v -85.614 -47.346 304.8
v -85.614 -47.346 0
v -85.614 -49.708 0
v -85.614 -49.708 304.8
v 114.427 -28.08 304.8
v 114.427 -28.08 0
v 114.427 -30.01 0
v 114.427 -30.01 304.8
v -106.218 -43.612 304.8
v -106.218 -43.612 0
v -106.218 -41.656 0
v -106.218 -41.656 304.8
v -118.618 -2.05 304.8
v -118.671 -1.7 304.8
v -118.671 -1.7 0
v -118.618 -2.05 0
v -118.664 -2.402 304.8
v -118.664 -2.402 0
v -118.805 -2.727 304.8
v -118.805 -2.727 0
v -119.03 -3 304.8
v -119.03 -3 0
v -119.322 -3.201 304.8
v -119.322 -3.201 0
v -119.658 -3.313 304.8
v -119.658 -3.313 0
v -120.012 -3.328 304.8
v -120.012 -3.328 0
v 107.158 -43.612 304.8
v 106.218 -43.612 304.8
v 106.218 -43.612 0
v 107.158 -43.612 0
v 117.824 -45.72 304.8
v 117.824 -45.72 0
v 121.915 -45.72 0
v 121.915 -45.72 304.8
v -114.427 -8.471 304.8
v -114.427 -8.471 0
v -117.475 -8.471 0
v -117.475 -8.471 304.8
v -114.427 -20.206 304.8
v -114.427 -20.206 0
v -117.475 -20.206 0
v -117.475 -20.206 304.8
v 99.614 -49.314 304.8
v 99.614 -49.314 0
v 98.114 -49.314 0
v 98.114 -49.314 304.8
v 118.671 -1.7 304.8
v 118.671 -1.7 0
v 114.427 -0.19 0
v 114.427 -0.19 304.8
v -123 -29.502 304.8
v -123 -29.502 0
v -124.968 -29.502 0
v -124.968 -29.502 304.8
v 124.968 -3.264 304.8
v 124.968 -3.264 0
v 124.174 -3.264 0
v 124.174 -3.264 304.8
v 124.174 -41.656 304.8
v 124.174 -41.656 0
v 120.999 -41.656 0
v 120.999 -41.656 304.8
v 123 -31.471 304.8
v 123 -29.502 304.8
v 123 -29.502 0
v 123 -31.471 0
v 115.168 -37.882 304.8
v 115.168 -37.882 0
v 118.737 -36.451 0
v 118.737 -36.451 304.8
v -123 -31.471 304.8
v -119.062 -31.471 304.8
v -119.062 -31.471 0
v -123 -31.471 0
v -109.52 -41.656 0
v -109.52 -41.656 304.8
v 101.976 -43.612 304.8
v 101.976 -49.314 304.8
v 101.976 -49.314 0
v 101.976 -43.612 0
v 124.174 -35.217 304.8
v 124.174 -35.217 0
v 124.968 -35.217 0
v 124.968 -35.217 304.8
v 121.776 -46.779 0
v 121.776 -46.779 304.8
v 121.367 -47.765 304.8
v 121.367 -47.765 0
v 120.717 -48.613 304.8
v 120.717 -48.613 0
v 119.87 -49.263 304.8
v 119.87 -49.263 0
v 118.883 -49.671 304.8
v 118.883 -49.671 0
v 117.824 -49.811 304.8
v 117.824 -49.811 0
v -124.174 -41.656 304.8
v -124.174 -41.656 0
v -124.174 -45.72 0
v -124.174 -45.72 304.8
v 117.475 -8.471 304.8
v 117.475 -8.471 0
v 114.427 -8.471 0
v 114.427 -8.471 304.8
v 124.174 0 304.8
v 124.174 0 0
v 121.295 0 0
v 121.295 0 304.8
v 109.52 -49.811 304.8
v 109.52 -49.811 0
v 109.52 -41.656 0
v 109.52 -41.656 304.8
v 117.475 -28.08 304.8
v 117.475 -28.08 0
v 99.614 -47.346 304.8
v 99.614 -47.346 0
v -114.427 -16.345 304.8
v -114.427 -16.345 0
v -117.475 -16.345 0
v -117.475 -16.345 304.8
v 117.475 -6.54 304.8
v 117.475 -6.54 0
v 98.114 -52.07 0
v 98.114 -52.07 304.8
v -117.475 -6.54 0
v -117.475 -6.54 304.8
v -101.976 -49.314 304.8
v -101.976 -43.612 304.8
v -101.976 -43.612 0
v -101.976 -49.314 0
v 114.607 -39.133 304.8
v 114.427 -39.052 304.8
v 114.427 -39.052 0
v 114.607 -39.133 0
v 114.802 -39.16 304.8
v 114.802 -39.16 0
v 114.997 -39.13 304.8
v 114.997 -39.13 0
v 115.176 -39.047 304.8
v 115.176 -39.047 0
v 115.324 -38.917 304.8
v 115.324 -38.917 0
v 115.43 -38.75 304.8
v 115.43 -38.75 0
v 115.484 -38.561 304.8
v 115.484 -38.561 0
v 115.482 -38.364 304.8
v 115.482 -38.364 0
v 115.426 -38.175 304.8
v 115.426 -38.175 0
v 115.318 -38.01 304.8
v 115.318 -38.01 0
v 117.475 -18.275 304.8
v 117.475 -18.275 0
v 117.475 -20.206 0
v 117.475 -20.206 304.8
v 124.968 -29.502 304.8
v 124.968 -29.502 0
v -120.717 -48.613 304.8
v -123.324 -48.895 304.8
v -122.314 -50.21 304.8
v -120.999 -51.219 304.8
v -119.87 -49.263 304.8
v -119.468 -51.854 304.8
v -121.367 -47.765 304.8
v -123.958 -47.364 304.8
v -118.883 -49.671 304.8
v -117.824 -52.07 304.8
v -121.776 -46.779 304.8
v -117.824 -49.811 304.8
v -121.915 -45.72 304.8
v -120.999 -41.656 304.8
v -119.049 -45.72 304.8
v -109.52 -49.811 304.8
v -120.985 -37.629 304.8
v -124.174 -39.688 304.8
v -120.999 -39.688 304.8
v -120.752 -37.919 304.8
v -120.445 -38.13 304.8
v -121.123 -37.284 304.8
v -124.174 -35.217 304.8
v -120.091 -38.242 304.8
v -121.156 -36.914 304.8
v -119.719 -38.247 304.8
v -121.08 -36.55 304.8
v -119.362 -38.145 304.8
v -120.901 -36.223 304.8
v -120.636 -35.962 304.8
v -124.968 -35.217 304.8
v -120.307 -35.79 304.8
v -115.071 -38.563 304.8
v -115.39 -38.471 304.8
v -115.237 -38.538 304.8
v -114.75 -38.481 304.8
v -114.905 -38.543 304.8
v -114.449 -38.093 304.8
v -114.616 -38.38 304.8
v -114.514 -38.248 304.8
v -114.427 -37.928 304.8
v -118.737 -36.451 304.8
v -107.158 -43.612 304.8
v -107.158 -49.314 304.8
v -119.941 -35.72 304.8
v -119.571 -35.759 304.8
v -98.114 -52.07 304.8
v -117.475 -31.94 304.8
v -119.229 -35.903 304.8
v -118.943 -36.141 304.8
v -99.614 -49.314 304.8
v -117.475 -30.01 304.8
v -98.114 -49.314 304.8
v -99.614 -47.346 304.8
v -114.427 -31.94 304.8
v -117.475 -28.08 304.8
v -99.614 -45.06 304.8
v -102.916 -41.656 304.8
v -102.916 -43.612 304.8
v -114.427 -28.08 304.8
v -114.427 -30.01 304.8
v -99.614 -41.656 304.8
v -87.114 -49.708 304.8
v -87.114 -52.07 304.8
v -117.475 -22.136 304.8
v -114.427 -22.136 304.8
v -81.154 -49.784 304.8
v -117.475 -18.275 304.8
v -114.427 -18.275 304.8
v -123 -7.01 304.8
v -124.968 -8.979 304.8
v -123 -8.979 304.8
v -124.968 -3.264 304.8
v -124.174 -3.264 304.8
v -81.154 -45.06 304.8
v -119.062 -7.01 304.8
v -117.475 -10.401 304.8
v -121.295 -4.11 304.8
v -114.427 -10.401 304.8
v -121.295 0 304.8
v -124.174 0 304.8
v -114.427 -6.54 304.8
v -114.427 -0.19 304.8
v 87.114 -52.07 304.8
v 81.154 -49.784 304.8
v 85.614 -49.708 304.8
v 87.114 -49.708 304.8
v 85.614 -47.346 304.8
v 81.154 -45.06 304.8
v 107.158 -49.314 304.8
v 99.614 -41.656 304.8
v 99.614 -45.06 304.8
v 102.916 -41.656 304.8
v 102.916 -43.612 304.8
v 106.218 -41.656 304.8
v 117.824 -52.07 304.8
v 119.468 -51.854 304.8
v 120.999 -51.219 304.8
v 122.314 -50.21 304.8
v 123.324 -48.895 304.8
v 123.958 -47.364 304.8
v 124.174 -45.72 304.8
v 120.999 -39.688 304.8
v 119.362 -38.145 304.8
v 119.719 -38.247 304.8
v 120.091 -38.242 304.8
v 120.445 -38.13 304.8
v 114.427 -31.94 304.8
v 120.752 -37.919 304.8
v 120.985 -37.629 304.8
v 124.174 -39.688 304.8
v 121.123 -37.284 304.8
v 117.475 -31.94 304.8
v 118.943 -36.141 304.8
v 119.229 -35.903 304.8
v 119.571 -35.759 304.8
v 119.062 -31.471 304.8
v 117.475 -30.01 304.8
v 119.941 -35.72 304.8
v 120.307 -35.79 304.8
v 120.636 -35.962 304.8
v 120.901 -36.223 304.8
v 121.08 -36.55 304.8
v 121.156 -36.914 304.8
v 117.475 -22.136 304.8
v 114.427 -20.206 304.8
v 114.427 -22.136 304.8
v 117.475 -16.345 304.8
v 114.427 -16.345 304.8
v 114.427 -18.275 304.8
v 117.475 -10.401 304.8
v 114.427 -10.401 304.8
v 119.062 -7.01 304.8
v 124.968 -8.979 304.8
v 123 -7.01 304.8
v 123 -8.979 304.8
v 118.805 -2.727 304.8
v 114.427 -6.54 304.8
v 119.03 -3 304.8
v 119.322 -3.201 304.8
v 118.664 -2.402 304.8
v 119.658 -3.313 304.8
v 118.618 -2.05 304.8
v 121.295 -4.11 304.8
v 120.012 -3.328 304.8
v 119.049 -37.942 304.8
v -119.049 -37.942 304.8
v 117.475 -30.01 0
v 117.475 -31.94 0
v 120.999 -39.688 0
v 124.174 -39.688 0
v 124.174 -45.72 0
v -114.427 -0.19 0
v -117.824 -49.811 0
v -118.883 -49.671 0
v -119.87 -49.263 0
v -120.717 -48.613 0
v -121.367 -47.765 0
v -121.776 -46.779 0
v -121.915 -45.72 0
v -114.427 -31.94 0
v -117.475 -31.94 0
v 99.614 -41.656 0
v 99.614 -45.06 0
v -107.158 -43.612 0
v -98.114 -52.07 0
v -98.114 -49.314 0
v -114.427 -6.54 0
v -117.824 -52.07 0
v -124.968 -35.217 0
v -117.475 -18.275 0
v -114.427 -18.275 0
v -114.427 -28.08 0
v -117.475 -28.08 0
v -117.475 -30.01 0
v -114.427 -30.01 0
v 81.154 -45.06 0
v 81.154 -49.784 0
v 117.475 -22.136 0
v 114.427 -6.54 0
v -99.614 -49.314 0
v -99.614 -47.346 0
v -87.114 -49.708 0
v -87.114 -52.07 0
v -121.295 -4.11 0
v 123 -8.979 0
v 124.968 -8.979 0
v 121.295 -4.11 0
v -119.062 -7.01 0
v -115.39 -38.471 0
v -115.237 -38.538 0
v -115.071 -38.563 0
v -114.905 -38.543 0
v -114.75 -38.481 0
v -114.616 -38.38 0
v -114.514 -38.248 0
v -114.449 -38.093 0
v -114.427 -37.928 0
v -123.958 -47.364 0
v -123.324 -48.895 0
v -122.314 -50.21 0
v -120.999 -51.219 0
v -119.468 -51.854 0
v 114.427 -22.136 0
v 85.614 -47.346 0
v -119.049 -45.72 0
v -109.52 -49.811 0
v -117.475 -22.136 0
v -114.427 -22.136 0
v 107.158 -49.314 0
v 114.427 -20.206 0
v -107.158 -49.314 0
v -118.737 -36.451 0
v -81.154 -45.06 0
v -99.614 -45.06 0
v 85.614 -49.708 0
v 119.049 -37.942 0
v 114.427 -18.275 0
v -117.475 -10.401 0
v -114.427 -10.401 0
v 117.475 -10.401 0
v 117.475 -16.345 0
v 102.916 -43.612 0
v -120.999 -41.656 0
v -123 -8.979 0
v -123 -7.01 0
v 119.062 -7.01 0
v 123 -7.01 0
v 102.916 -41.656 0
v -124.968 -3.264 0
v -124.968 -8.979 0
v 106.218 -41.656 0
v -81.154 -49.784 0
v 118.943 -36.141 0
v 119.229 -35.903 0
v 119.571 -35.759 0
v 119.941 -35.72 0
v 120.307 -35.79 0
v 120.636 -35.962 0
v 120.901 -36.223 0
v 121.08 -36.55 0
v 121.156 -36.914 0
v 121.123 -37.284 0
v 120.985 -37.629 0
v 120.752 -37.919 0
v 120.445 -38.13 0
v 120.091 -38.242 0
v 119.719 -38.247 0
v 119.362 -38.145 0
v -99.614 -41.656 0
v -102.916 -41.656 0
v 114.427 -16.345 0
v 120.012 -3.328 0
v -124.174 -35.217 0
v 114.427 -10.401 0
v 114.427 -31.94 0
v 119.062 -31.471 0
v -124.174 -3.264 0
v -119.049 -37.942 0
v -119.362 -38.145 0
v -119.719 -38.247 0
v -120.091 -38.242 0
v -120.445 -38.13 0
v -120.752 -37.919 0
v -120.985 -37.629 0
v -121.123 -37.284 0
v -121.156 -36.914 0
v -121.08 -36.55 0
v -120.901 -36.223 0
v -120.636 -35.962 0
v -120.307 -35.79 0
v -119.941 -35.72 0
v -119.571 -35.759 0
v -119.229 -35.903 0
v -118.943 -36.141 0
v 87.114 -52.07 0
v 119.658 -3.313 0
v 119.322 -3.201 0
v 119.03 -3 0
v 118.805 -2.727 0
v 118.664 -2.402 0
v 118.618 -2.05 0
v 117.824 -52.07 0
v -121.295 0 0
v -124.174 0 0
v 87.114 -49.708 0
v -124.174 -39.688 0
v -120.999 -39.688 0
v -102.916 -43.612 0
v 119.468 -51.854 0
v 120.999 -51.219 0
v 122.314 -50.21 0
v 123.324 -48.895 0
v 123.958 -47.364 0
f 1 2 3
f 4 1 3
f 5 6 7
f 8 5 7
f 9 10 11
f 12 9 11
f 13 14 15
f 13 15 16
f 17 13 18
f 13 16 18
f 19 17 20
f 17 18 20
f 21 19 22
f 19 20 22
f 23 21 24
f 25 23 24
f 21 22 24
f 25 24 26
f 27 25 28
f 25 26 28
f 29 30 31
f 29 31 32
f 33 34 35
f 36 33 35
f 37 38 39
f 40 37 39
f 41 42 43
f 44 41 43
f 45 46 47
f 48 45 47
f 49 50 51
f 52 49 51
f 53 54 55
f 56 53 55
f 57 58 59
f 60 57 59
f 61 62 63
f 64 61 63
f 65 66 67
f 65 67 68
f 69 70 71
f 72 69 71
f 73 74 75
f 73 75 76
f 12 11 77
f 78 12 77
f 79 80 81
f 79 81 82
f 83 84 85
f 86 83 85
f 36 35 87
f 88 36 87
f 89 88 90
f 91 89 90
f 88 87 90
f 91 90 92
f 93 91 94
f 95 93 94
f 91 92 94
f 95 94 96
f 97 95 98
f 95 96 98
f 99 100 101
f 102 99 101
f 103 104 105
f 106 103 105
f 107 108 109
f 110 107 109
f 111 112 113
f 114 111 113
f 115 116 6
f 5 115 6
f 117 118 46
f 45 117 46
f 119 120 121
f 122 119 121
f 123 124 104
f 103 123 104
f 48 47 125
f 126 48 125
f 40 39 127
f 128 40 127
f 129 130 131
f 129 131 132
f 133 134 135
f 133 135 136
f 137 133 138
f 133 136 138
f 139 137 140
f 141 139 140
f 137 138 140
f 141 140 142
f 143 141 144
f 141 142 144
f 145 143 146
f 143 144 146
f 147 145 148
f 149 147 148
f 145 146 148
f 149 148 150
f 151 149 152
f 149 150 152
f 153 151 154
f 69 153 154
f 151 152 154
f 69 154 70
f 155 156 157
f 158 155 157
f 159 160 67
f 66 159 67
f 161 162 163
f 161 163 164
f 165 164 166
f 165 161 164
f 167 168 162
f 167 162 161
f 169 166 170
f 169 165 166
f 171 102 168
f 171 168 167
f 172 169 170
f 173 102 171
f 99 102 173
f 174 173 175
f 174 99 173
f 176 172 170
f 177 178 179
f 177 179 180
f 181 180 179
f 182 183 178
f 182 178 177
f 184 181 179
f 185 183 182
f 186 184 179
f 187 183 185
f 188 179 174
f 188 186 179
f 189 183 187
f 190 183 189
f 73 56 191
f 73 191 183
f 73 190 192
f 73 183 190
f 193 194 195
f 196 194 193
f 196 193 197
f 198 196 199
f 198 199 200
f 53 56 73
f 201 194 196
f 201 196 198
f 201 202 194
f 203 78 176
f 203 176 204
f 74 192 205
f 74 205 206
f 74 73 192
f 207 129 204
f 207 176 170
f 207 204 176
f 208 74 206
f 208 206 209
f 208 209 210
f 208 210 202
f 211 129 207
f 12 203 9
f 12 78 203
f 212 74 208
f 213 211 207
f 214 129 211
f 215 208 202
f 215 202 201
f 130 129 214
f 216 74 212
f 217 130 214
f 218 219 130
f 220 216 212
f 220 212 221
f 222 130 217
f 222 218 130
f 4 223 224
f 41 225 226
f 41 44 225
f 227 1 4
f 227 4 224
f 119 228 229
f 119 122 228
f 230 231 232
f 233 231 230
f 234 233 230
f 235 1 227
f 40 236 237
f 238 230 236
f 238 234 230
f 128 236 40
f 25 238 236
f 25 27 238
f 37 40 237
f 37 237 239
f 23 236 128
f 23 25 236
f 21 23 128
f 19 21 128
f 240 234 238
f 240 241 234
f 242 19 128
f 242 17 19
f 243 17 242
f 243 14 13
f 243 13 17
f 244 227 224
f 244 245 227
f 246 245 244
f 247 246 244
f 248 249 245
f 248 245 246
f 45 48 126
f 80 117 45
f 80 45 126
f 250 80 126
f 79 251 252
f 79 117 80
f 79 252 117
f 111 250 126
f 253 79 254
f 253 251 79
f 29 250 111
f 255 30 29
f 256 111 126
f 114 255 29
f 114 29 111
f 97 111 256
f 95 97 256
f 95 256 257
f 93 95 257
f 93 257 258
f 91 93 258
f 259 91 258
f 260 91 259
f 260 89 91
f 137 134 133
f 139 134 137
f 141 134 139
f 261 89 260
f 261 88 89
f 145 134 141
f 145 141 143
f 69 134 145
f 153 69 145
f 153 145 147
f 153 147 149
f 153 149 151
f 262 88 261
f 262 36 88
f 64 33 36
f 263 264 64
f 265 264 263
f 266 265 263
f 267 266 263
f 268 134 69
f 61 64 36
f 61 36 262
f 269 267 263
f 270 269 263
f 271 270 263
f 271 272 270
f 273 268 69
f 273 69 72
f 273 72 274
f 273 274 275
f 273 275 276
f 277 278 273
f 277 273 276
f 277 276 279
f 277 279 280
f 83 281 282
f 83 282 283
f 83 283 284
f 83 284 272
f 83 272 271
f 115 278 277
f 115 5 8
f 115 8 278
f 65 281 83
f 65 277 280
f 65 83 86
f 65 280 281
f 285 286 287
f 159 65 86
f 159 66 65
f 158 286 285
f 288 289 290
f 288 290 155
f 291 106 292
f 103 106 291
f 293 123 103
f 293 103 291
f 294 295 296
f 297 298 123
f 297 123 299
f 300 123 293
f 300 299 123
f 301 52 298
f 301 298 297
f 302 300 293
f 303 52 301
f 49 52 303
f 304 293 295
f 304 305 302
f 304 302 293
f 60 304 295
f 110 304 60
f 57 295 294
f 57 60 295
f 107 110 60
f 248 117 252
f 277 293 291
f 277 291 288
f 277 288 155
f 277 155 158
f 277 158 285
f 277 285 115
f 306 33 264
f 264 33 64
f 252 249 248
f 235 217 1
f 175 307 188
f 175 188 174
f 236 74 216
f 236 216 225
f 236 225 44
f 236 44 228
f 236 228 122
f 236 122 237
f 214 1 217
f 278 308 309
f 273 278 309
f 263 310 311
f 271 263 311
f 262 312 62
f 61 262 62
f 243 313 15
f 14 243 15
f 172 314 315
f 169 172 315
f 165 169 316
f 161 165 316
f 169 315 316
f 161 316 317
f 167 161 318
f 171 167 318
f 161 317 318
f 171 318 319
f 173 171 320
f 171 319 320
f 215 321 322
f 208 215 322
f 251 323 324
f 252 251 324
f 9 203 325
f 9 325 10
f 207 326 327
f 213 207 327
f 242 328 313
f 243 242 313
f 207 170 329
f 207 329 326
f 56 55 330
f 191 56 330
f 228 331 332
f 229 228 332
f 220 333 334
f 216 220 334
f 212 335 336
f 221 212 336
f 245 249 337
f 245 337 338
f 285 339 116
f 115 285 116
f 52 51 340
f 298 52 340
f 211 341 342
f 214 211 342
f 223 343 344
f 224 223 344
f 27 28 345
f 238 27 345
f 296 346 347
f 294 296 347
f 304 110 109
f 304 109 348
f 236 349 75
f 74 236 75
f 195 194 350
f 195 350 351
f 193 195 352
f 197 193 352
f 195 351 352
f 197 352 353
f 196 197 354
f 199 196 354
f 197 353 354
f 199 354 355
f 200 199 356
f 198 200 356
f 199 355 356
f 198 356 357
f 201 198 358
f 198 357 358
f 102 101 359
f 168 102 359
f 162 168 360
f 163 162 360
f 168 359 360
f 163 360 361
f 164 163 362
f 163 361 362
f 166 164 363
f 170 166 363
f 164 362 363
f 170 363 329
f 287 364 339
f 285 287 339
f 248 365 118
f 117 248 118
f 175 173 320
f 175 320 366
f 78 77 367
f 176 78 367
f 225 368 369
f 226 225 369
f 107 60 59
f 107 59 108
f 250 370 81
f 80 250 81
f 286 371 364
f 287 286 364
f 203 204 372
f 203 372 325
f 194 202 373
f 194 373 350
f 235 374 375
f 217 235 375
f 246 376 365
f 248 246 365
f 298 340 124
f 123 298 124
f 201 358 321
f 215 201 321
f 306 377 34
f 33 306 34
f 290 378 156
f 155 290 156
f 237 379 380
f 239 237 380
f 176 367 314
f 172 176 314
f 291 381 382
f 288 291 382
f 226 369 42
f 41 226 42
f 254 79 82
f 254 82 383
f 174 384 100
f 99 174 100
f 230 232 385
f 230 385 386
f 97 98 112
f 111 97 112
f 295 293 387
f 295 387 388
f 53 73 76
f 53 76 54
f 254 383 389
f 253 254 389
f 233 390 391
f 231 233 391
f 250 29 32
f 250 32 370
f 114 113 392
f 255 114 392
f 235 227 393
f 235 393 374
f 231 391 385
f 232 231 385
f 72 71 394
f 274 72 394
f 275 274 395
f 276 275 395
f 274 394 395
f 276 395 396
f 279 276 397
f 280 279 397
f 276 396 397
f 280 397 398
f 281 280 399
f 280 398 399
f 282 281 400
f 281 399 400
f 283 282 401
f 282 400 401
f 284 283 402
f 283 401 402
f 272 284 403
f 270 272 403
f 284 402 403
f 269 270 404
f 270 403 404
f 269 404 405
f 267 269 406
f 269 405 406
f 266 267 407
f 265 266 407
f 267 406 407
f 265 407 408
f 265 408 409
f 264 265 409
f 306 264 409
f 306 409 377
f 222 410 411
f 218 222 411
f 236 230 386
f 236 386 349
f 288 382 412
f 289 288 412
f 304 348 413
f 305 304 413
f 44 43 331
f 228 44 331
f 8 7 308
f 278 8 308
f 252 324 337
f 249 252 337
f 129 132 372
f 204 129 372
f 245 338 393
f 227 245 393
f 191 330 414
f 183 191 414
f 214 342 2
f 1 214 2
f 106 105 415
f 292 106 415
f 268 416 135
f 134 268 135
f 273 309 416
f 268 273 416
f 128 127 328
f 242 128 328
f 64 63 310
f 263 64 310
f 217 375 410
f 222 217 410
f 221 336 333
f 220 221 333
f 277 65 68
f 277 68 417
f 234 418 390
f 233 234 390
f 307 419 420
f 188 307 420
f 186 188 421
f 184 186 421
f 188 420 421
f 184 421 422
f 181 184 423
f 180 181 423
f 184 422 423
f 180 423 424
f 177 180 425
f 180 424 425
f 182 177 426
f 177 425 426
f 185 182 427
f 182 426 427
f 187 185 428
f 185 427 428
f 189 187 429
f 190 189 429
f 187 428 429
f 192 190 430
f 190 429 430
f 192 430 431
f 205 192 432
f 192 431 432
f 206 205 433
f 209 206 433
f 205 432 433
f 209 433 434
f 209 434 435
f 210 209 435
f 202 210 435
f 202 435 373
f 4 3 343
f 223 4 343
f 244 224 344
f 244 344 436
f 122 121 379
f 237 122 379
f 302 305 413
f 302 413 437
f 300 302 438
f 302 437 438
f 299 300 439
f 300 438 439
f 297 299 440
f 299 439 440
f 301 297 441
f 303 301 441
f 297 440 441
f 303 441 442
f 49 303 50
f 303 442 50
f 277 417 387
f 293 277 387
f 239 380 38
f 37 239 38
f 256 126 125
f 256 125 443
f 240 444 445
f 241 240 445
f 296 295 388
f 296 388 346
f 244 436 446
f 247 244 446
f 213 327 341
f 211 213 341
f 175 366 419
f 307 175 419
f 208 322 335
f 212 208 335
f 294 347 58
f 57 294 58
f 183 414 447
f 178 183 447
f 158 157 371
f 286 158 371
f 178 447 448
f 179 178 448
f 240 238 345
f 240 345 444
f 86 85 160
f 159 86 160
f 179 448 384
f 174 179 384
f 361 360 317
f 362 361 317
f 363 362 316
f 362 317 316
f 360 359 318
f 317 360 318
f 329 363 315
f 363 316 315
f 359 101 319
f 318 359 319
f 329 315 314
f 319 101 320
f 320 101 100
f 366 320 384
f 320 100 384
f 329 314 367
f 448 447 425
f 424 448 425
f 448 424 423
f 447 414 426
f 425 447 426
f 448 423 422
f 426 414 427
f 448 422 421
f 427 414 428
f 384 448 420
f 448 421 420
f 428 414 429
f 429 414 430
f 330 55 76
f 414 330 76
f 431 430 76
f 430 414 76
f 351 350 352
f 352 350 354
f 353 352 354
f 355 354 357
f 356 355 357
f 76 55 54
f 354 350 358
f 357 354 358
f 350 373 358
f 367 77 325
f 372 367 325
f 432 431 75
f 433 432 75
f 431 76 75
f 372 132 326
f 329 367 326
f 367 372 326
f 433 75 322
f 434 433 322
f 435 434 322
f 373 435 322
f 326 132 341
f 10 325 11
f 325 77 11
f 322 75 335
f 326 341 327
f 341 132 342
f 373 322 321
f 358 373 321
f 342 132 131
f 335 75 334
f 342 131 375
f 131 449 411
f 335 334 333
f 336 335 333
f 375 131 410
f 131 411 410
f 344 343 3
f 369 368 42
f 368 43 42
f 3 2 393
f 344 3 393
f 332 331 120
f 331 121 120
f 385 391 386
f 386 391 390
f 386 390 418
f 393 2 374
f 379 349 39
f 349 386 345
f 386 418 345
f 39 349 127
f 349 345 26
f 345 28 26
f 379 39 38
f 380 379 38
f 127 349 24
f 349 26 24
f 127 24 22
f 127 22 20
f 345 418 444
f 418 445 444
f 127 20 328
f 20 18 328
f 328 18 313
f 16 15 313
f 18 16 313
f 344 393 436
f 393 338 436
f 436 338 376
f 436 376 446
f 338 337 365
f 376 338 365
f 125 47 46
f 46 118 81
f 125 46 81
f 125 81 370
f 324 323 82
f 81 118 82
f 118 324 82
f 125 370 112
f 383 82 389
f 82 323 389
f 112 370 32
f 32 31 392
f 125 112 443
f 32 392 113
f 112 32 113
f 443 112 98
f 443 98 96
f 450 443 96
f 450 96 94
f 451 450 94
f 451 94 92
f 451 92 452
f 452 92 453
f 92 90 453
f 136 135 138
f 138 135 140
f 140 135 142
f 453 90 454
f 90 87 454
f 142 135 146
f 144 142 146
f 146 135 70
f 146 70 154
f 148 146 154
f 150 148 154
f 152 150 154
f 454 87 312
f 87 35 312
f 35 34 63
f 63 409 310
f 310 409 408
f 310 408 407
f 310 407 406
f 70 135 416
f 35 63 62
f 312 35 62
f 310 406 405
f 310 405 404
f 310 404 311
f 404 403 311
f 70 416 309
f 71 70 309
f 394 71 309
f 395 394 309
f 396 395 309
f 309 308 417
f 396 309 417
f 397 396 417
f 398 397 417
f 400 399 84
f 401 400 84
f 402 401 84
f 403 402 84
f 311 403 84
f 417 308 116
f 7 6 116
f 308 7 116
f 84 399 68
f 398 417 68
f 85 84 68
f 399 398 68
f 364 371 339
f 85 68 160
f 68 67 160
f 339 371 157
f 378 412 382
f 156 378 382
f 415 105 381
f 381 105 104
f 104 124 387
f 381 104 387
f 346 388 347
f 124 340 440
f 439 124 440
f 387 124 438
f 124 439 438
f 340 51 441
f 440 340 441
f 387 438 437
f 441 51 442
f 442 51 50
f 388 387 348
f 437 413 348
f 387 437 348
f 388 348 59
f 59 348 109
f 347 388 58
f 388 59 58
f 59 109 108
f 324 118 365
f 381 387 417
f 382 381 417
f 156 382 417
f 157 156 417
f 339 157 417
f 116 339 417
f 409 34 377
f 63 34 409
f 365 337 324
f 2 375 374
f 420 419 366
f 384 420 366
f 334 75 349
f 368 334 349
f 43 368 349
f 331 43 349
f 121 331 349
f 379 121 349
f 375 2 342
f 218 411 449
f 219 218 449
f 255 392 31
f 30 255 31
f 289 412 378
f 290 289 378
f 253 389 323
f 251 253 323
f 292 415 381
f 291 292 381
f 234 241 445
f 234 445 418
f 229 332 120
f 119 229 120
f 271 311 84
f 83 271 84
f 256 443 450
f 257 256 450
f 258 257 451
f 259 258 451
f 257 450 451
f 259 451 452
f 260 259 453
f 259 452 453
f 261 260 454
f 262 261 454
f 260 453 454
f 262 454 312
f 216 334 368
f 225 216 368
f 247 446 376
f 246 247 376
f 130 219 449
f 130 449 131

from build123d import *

# Parameters (mm, degrees)
MAINBODY_DEPTH = 304.8


with BuildPart() as part:
    # Sketch2 → MainBody (new body)
    with BuildSketch(Plane.XY):
        with BuildLine():
            Line((-87.11385, -52.07), (87.11385, -52.07))
            Line((87.11385, -52.07), (87.11385, -49.7078))
            Line((87.11385, -49.7078), (85.61385, -49.7078))
            Line((85.61385, -49.7078), (85.61385, -47.3456))
            Line((85.61385, -47.3456), (99.61385, -47.3456))
            Line((99.61385, -47.3456), (99.61385, -49.3141))
            Line((99.61385, -49.3141), (98.11385, -49.3141))
            Line((98.11385, -49.3141), (98.11385, -52.07))
            Line((98.11385, -52.07), (117.82425, -52.07))
            ThreePointArc((117.82425, -52.07), (122.314378061, -50.210128061), (124.17425, -45.72))
            Line((124.17425, -45.72), (124.17425, -41.656))
            Line((124.17425, -41.656), (120.99925, -41.656))
            Line((120.99925, -41.656), (120.99925, -39.6875))
            Line((120.99925, -39.6875), (124.17425, -39.6875))
            Line((124.17425, -39.6875), (124.17425, -35.2171))
            Line((124.17425, -35.2171), (124.968, -35.2171))
            Line((124.968, -35.2171), (124.968, -29.5021))
            Line((124.968, -29.5021), (122.9995, -29.5021))
            Line((122.9995, -29.5021), (122.9995, -31.4706))
            Line((122.9995, -31.4706), (119.0625, -31.4706))
            Line((119.0625, -31.4706), (119.0625, -7.0104))
            Line((119.0625, -7.0104), (122.9995, -7.0104))
            Line((122.9995, -7.0104), (122.9995, -8.9789))
            Line((122.9995, -8.9789), (124.968, -8.9789))
            Line((124.968, -8.9789), (124.968, -3.2639))
            Line((124.968, -3.2639), (124.17425, -3.2639))
            Line((124.17425, -3.2639), (124.17425, 0))
            Line((124.17425, 0), (121.29481323, 0))
            Line((121.29481323, 0), (121.29481323, -4.109997352))
            Line((121.29481323, -4.109997352), (120.011918892, -3.327689915))
            ThreePointArc((120.011918892, -3.327689915), (118.907723578, -2.871189246), (118.671208827, -1.699992881))
            Line((118.671208827, -1.699992881), (114.427, -0.1905))
            Line((114.427, -0.1905), (114.427, -6.5405))
            Line((114.427, -6.5405), (117.475, -6.5405))
            Line((117.475, -6.5405), (117.475, -8.4709))
            Line((117.475, -8.4709), (114.427, -8.4709))
            Line((114.427, -8.4709), (114.427, -10.4013))
            Line((114.427, -10.4013), (117.475, -10.4013))
            Line((117.475, -10.4013), (117.475, -16.3449))
            Line((117.475, -16.3449), (114.427, -16.3449))
            Line((114.427, -16.3449), (114.427, -18.2753))
            Line((114.427, -18.2753), (117.475, -18.2753))
            Line((117.475, -18.2753), (117.475, -20.2057))
            Line((117.475, -20.2057), (114.427, -20.2057))
            Line((114.427, -20.2057), (114.427, -22.1361))
            Line((114.427, -22.1361), (117.475, -22.1361))
            Line((117.475, -22.1361), (117.475, -28.0797))
            Line((117.475, -28.0797), (114.427, -28.0797))
            Line((114.427, -28.0797), (114.427, -30.0101))
            Line((114.427, -30.0101), (117.475, -30.0101))
            Line((117.475, -30.0101), (117.475, -31.9405))
            Line((117.475, -31.9405), (114.427, -31.9405))
            Line((114.427, -31.9405), (114.427, -39.0525))
            ThreePointArc((114.427, -39.0525), (115.382882445, -38.837450889), (115.167833333, -37.881568444))
            Line((115.167833333, -37.881568444), (118.737456339, -36.45102397))
            ThreePointArc((118.737456339, -36.45102397), (121.131104208, -36.728765521), (119.049383871, -37.942491573))
            Line((119.049383871, -37.942491573), (117.82425, -45.72))
            Line((117.82425, -45.72), (121.915072727, -45.72))
            ThreePointArc((121.915072727, -45.72), (120.716898491, -48.612648491), (117.82425, -49.810822727))
            Line((117.82425, -49.810822727), (109.51985, -49.810822727))
            Line((109.51985, -49.810822727), (109.51985, -41.656))
            Line((109.51985, -41.656), (106.21785, -41.656))
            Line((106.21785, -41.656), (106.21785, -43.6118))
            Line((106.21785, -43.6118), (107.15765, -43.6118))
            Line((107.15765, -43.6118), (107.15765, -49.3141))
            Line((107.15765, -49.3141), (101.97605, -49.3141))
            Line((101.97605, -49.3141), (101.97605, -43.6118))
            Line((101.97605, -43.6118), (102.91585, -43.6118))
            Line((102.91585, -43.6118), (102.91585, -41.656))
            Line((102.91585, -41.656), (99.61385, -41.656))
            Line((99.61385, -41.656), (99.61385, -45.0596))
            Line((99.61385, -45.0596), (81.154405407, -45.0596))
            Line((81.154405407, -45.0596), (81.154405407, -49.784))
            Line((81.154405407, -49.784), (-81.154405407, -49.784))
            Line((-81.154405407, -49.784), (-81.154405407, -45.0596))
            Line((-81.154405407, -45.0596), (-99.61385, -45.0596))
            Line((-99.61385, -45.0596), (-99.61385, -41.656))
            Line((-99.61385, -41.656), (-102.91585, -41.656))
            Line((-102.91585, -41.656), (-102.91585, -43.6118))
            Line((-102.91585, -43.6118), (-101.97605, -43.6118))
            Line((-101.97605, -43.6118), (-101.97605, -49.3141))
            Line((-101.97605, -49.3141), (-107.15765, -49.3141))
            Line((-107.15765, -49.3141), (-107.15765, -43.6118))
            Line((-107.15765, -43.6118), (-106.21785, -43.6118))
            Line((-106.21785, -43.6118), (-106.21785, -41.656))
            Line((-106.21785, -41.656), (-109.51985, -41.656))
            Line((-109.51985, -41.656), (-109.51985, -49.810822727))
            Line((-109.51985, -49.810822727), (-117.82425, -49.810822727))
            ThreePointArc((-117.82425, -49.810822727), (-120.716898491, -48.612648491), (-121.915072727, -45.72))
            Line((-121.915072727, -45.72), (-119.049383871, -45.72))
            Line((-119.049383871, -45.72), (-119.049383871, -37.942491573))
            ThreePointArc((-119.049383871, -37.942491573), (-121.131104208, -36.728765521), (-118.737456339, -36.45102397))
            Line((-118.737456339, -36.45102397), (-115.390113559, -38.471235131))
            ThreePointArc((-115.390113559, -38.471235131), (-114.749851886, -38.480556372), (-114.427, -37.927574858))
            Line((-114.427, -37.927574858), (-114.427, -31.9405))
            Line((-114.427, -31.9405), (-117.475, -31.9405))
            Line((-117.475, -31.9405), (-117.475, -30.0101))
            Line((-117.475, -30.0101), (-114.427, -30.0101))
            Line((-114.427, -30.0101), (-114.427, -28.0797))
            Line((-114.427, -28.0797), (-117.475, -28.0797))
            Line((-117.475, -28.0797), (-117.475, -22.1361))
            Line((-117.475, -22.1361), (-114.427, -22.1361))
            Line((-114.427, -22.1361), (-114.427, -20.2057))
            Line((-114.427, -20.2057), (-117.475, -20.2057))
            Line((-117.475, -20.2057), (-117.475, -18.2753))
            Line((-117.475, -18.2753), (-114.427, -18.2753))
            Line((-114.427, -18.2753), (-114.427, -16.3449))
            Line((-114.427, -16.3449), (-117.475, -16.3449))
            Line((-117.475, -16.3449), (-117.475, -10.4013))
            Line((-117.475, -10.4013), (-114.427, -10.4013))
            Line((-114.427, -10.4013), (-114.427, -8.4709))
            Line((-114.427, -8.4709), (-117.475, -8.4709))
            Line((-117.475, -8.4709), (-117.475, -6.5405))
            Line((-117.475, -6.5405), (-114.427, -6.5405))
            Line((-114.427, -6.5405), (-114.427, -0.1905))
            Line((-114.427, -0.1905), (-118.671208827, -1.699992881))
            ThreePointArc((-118.671208827, -1.699992881), (-118.907723578, -2.871189246), (-120.011918892, -3.327689915))
            Line((-120.011918892, -3.327689915), (-121.29481323, -4.109997352))
            Line((-121.29481323, -4.109997352), (-121.29481323, 0))
            Line((-121.29481323, 0), (-124.17425, 0))
            Line((-124.17425, 0), (-124.17425, -3.2639))
            Line((-124.17425, -3.2639), (-124.968, -3.2639))
            Line((-124.968, -3.2639), (-124.968, -8.9789))
            Line((-124.968, -8.9789), (-122.9995, -8.9789))
            Line((-122.9995, -8.9789), (-122.9995, -7.0104))
            Line((-122.9995, -7.0104), (-119.0625, -7.0104))
            Line((-119.0625, -7.0104), (-119.0625, -31.4706))
            Line((-119.0625, -31.4706), (-122.9995, -31.4706))
            Line((-122.9995, -31.4706), (-122.9995, -29.5021))
            Line((-122.9995, -29.5021), (-124.968, -29.5021))
            Line((-124.968, -29.5021), (-124.968, -35.2171))
            Line((-124.968, -35.2171), (-124.17425, -35.2171))
            Line((-124.17425, -35.2171), (-124.17425, -39.6875))
            Line((-124.17425, -39.6875), (-120.99925, -39.6875))
            Line((-120.99925, -39.6875), (-120.99925, -41.656))
            Line((-120.99925, -41.656), (-124.17425, -41.656))
            Line((-124.17425, -41.656), (-124.17425, -45.72))
            ThreePointArc((-124.17425, -45.72), (-122.314378061, -50.210128061), (-117.82425, -52.07))
            Line((-117.82425, -52.07), (-98.11385, -52.07))
            Line((-98.11385, -52.07), (-98.11385, -49.3141))
            Line((-98.11385, -49.3141), (-99.61385, -49.3141))
            Line((-99.61385, -49.3141), (-99.61385, -47.3456))
            Line((-99.61385, -47.3456), (-85.61385, -47.3456))
            Line((-85.61385, -47.3456), (-85.61385, -49.7078))
            Line((-85.61385, -49.7078), (-87.11385, -49.7078))
            Line((-87.11385, -49.7078), (-87.11385, -52.07))
        make_face()
    extrude(amount=MAINBODY_DEPTH)


solid = part.part
